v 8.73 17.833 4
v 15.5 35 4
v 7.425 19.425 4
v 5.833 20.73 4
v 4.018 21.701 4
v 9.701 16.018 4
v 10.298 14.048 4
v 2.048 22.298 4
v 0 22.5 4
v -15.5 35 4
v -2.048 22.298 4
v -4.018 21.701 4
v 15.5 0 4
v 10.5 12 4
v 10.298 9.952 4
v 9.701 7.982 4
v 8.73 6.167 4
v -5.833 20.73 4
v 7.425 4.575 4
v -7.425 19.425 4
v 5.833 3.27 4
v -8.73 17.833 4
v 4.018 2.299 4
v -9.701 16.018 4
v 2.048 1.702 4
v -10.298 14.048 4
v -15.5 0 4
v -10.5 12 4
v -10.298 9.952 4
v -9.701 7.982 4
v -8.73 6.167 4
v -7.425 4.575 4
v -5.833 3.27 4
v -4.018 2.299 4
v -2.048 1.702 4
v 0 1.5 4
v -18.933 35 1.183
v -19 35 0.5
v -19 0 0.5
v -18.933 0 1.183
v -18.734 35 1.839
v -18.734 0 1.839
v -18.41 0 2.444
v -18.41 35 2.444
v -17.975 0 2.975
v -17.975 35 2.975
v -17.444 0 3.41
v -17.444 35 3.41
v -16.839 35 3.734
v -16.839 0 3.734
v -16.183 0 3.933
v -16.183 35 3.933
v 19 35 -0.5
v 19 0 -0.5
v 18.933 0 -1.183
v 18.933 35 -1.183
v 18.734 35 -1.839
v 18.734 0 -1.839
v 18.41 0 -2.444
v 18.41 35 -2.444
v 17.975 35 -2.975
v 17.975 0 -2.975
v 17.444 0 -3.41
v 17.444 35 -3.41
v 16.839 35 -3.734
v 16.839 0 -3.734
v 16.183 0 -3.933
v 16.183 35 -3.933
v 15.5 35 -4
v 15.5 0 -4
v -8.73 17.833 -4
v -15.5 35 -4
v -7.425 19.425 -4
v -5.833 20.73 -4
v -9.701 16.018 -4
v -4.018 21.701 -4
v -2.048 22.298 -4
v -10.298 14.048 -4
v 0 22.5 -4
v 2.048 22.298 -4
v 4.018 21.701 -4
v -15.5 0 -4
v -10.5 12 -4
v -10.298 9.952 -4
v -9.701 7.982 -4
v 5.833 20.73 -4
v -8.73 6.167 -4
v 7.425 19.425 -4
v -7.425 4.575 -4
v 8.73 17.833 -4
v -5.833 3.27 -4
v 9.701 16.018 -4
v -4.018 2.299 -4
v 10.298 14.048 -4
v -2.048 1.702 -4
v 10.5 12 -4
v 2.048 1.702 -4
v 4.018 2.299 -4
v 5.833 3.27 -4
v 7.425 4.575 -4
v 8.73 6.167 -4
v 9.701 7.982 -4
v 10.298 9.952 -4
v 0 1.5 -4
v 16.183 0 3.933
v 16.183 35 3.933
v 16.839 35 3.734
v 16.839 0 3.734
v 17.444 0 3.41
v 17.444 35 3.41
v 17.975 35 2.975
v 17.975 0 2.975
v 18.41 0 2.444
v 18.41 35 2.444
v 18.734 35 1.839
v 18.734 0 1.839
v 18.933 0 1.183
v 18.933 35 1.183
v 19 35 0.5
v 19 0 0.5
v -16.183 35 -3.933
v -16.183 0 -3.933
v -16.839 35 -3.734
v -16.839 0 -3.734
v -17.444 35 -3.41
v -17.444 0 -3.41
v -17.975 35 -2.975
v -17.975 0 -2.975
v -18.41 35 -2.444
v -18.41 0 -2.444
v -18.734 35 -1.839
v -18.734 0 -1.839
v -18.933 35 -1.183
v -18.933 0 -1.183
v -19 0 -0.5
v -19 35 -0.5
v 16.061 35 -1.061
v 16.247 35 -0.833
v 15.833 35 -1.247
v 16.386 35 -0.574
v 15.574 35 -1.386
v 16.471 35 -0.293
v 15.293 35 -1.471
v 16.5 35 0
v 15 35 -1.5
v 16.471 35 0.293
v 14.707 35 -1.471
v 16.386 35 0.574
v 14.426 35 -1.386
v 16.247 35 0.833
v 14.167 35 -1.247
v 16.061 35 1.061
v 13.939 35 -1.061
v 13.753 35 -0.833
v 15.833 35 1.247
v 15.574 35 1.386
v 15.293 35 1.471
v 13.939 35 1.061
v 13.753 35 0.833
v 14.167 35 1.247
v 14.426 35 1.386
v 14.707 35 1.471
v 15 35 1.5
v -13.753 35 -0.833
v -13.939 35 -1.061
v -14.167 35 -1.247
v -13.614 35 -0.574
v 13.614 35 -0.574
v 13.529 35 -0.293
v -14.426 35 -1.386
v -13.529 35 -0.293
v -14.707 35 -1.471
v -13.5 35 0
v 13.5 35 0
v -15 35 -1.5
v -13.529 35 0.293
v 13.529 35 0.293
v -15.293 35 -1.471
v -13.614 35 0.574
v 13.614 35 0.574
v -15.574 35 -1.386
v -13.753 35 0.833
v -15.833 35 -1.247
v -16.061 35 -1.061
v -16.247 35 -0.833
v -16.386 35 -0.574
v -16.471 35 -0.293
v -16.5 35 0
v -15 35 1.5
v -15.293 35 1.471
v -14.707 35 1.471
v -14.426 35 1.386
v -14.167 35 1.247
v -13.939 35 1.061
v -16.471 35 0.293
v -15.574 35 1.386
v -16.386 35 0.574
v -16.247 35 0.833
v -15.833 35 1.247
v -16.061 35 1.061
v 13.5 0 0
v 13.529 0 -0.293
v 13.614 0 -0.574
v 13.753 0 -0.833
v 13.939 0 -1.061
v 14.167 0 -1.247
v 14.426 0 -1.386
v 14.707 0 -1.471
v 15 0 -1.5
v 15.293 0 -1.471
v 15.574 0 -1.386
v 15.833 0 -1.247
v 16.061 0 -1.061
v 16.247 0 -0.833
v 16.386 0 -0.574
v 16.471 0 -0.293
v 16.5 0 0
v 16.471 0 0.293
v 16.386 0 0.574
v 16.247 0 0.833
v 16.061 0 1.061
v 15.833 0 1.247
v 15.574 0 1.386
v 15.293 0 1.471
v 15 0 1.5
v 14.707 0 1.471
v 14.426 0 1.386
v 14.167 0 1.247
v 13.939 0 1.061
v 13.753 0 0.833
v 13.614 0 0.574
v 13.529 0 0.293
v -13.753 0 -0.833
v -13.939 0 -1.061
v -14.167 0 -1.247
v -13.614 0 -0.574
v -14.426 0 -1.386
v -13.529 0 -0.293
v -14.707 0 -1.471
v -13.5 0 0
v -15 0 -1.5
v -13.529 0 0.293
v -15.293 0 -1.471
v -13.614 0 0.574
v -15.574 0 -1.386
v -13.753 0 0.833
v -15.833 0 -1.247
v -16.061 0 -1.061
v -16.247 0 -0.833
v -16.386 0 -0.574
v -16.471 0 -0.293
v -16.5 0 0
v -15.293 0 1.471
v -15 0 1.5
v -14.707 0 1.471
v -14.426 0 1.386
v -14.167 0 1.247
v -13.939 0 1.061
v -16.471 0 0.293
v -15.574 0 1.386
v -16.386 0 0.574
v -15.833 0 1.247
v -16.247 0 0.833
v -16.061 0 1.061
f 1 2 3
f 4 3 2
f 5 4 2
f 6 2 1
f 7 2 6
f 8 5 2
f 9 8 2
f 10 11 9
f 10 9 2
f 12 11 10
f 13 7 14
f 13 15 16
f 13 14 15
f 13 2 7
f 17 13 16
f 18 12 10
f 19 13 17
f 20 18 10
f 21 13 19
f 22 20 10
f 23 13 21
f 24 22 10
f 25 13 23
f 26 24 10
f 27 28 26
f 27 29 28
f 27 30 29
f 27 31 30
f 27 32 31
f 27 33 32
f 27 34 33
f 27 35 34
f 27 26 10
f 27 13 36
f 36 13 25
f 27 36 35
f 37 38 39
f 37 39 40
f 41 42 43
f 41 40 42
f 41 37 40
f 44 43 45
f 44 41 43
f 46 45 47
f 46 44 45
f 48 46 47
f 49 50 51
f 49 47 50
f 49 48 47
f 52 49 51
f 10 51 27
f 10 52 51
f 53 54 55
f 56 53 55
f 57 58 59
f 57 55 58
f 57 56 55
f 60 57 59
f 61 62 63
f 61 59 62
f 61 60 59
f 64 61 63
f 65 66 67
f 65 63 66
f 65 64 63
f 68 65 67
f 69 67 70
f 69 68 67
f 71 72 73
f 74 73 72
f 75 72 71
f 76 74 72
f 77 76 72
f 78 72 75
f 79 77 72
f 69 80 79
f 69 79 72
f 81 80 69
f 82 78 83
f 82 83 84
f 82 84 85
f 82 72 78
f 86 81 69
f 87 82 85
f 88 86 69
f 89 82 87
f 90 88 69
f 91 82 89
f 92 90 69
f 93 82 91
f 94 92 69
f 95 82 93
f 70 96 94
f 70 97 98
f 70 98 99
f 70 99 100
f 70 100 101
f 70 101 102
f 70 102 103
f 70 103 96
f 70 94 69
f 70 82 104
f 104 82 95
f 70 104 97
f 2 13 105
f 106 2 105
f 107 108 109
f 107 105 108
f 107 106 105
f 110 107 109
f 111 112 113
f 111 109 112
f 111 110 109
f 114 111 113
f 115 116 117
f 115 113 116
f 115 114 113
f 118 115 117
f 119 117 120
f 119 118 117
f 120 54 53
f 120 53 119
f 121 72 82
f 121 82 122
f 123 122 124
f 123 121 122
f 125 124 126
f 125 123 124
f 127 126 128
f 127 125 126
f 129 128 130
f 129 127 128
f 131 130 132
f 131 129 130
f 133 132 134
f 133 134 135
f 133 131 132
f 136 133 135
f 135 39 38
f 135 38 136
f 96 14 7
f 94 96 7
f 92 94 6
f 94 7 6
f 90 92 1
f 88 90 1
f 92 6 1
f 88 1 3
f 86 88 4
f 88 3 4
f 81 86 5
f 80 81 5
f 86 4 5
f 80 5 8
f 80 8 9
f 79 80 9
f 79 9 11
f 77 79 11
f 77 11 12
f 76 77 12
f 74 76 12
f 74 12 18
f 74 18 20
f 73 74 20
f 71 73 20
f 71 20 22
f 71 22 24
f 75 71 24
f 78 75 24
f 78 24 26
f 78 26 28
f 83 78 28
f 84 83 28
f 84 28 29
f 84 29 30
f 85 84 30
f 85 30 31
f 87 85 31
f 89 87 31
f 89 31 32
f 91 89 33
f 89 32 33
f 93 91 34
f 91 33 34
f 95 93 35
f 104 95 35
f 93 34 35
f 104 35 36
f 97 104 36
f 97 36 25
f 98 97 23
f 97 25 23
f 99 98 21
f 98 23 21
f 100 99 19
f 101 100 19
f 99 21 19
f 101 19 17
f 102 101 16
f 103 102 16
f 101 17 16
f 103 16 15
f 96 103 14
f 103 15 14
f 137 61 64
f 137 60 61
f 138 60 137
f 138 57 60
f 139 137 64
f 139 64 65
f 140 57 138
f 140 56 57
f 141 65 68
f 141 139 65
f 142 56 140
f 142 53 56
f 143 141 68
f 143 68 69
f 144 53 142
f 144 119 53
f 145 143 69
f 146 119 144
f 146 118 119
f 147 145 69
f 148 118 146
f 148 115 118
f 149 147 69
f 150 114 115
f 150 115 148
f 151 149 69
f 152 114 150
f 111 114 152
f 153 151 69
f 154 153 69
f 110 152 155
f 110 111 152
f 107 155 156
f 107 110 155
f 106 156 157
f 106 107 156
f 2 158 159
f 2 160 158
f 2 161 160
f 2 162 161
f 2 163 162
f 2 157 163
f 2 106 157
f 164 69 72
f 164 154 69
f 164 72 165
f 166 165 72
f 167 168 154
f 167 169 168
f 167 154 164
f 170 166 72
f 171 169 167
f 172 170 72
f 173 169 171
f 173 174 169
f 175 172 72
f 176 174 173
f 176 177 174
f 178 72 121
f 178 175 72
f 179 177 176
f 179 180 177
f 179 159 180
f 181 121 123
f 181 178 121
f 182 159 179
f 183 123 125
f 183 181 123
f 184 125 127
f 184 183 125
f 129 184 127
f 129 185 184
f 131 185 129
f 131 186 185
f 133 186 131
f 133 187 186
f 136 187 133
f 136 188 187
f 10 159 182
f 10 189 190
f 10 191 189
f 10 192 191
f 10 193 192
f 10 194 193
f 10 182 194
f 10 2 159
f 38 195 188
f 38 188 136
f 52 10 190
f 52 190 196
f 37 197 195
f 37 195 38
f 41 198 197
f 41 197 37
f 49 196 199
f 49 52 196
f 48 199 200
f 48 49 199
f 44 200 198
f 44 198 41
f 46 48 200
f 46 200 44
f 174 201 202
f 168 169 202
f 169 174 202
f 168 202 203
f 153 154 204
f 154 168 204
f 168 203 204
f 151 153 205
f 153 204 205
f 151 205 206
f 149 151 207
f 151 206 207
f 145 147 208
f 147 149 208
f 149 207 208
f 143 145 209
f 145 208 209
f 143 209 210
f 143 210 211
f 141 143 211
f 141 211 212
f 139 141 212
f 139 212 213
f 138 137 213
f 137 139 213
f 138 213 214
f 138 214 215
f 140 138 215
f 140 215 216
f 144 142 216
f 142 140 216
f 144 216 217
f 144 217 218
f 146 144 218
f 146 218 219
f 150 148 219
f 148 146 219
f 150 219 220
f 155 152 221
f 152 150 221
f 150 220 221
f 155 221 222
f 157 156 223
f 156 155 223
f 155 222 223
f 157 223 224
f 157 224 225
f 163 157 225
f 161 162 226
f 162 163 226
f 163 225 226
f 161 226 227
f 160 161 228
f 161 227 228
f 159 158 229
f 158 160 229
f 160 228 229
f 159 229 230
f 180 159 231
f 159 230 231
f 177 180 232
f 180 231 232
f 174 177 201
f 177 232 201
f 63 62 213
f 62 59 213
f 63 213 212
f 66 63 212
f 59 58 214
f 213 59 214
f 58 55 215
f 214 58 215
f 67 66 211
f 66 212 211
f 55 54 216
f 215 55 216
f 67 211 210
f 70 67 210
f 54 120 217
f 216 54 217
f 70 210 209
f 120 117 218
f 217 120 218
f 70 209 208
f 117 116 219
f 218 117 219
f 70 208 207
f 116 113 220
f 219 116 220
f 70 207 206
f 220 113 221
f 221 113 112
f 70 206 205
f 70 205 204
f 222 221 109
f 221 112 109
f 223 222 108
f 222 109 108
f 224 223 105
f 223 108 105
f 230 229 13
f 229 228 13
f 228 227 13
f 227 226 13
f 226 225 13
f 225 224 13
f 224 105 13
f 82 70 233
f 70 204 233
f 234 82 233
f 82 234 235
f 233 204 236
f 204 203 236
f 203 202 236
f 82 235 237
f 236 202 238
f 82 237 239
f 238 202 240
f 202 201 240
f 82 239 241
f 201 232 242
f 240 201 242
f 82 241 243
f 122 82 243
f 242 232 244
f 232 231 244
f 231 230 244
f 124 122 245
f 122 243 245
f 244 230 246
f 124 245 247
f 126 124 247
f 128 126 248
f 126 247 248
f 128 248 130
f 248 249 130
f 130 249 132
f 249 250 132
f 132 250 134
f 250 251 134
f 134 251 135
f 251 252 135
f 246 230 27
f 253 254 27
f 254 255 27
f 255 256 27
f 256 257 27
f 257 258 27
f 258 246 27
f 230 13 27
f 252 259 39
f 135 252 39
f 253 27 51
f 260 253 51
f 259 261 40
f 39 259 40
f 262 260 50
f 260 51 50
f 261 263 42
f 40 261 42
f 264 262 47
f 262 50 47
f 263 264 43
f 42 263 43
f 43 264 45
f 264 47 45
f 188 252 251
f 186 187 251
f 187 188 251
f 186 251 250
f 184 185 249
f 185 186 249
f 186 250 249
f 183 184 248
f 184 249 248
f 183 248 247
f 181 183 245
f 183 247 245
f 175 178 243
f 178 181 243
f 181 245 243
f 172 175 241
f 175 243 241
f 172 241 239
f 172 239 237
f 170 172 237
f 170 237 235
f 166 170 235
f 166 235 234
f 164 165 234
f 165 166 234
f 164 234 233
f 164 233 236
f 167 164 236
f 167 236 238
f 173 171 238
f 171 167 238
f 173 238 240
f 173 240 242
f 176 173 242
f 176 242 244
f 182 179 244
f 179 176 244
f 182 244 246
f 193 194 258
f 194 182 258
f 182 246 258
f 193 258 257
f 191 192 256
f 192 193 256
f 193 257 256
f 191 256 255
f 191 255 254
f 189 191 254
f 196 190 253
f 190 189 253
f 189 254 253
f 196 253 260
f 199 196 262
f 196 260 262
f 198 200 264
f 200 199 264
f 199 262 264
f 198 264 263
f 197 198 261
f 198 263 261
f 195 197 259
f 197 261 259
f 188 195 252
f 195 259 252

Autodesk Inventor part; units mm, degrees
ref_plane "YZ Plane" through (0, 0, 0) normal (1, 0, 0) x (0, 1, 0)
ref_plane "XZ Plane" through (0, 0, 0) normal (0, 1, 0) x (-1, 0, 0)
ref_plane "XY Plane" through (0, 0, 0) normal (0, 0, 1) x (1, 0, 0)
sketch "Эскиз1" plane through (0, 0, 0) normal (1, 0, 0) x (0, 1, 0)
  point P0 (0, 0)
sketch "Эскиз2" plane through (0, 0, 0) normal (0, 1, 0) x (-1, 0, 0)
  line L0 (19, -4) -> (-19, -4)
  line L1 (-19, -4) -> (-19, 4)
  line L2 (-19, 4) -> (19, 4)
  line L3 (19, 4) -> (19, -4)
  line L4 (19, -4) -> (-19, 4) construction
  line L5 (-19, -4) -> (19, 4) construction
  line L6 (19, 0) -> (-19, 0) construction
  circle A0 centre (-15, 0) radius 1.5
  line L7 (0, -4) -> (0, 4) construction
  circle A1 centre (15, 0) radius 1.5
  point P0 (0, 0)
  dimension "d1" = 30
  dimension "d2" = 3
  dimension "d3" = 38
  dimension "d4" = 8
extrude "Выдавливание1" add sketch "Эскиз2" along normal blind 35
fillet "Сопряжение1" radius 3.5 4 edges at (19, 17.5, 4) (19, 17.5, -4) (-19, 17.5, 4) (-19, 17.5, -4)
sketch "Эскиз3" plane through (-15.5, 0, 4) normal (0, 0, 1) x (1, 0, 0)
  line L0 (29, 35) -> (29, 0) construction
  line L1 (0, 0) -> (0, 35) construction
  line L2 (0, 0) -> (31, 0) construction
  line L3 (31, 35) -> (31, 0) construction
  line L4 (0, 35) -> (31, 35) construction
  line L5 (32, 35) -> (32, 0) construction
  line L6 (34.5, 35) -> (31, 35) construction
  line L7 (31, 35) -> (31, 0) construction
  line L8 (31, 0) -> (34.5, 0) construction
  line L9 (34.5, 0) -> (34.5, 35) construction
  line L10 (-1, 35) -> (-1, 0) construction
  line L11 (0, 35) -> (-3.5, 35) construction
  line L12 (-3.5, 35) -> (-3.5, 0) construction
  line L13 (-3.5, 0) -> (0, 0) construction
  line L14 (0, 0) -> (0, 35) construction
  line L15 (0, 0) -> (0, 35) construction
  line L16 (-1, 35) -> (2, 35) construction
  line L17 (29, 35) -> (32, 35) construction
  line L18 (29, 0) -> (32, 0) construction
  line L19 (-1, 35) -> (2, 35) construction
  line L20 (-1, 0) -> (2, 0) construction
  line L21 (-1, 35) -> (2, 35) construction
  line L22 (-1, 0) -> (2, 0) construction
  line L23 (2, 35) -> (2, 0) construction
  line L24 (29, 35) -> (2, 0) construction
  line L25 (2, 35) -> (29, 0) construction
  line L26 (15.5, 17.5) -> (15.5, 35) construction
  line L27 (0, 35) -> (31, 35) construction
  circle A0 centre (15.5, 12) radius 10.5
  point P0 (15.5, 0)
  dimension "d8" = 21
  dimension "d9" = 12
extrude "Выдавливание2" cut sketch "Эскиз3" against normal blind 35
properties part number "mid_mount" material "Пластик АБС"
